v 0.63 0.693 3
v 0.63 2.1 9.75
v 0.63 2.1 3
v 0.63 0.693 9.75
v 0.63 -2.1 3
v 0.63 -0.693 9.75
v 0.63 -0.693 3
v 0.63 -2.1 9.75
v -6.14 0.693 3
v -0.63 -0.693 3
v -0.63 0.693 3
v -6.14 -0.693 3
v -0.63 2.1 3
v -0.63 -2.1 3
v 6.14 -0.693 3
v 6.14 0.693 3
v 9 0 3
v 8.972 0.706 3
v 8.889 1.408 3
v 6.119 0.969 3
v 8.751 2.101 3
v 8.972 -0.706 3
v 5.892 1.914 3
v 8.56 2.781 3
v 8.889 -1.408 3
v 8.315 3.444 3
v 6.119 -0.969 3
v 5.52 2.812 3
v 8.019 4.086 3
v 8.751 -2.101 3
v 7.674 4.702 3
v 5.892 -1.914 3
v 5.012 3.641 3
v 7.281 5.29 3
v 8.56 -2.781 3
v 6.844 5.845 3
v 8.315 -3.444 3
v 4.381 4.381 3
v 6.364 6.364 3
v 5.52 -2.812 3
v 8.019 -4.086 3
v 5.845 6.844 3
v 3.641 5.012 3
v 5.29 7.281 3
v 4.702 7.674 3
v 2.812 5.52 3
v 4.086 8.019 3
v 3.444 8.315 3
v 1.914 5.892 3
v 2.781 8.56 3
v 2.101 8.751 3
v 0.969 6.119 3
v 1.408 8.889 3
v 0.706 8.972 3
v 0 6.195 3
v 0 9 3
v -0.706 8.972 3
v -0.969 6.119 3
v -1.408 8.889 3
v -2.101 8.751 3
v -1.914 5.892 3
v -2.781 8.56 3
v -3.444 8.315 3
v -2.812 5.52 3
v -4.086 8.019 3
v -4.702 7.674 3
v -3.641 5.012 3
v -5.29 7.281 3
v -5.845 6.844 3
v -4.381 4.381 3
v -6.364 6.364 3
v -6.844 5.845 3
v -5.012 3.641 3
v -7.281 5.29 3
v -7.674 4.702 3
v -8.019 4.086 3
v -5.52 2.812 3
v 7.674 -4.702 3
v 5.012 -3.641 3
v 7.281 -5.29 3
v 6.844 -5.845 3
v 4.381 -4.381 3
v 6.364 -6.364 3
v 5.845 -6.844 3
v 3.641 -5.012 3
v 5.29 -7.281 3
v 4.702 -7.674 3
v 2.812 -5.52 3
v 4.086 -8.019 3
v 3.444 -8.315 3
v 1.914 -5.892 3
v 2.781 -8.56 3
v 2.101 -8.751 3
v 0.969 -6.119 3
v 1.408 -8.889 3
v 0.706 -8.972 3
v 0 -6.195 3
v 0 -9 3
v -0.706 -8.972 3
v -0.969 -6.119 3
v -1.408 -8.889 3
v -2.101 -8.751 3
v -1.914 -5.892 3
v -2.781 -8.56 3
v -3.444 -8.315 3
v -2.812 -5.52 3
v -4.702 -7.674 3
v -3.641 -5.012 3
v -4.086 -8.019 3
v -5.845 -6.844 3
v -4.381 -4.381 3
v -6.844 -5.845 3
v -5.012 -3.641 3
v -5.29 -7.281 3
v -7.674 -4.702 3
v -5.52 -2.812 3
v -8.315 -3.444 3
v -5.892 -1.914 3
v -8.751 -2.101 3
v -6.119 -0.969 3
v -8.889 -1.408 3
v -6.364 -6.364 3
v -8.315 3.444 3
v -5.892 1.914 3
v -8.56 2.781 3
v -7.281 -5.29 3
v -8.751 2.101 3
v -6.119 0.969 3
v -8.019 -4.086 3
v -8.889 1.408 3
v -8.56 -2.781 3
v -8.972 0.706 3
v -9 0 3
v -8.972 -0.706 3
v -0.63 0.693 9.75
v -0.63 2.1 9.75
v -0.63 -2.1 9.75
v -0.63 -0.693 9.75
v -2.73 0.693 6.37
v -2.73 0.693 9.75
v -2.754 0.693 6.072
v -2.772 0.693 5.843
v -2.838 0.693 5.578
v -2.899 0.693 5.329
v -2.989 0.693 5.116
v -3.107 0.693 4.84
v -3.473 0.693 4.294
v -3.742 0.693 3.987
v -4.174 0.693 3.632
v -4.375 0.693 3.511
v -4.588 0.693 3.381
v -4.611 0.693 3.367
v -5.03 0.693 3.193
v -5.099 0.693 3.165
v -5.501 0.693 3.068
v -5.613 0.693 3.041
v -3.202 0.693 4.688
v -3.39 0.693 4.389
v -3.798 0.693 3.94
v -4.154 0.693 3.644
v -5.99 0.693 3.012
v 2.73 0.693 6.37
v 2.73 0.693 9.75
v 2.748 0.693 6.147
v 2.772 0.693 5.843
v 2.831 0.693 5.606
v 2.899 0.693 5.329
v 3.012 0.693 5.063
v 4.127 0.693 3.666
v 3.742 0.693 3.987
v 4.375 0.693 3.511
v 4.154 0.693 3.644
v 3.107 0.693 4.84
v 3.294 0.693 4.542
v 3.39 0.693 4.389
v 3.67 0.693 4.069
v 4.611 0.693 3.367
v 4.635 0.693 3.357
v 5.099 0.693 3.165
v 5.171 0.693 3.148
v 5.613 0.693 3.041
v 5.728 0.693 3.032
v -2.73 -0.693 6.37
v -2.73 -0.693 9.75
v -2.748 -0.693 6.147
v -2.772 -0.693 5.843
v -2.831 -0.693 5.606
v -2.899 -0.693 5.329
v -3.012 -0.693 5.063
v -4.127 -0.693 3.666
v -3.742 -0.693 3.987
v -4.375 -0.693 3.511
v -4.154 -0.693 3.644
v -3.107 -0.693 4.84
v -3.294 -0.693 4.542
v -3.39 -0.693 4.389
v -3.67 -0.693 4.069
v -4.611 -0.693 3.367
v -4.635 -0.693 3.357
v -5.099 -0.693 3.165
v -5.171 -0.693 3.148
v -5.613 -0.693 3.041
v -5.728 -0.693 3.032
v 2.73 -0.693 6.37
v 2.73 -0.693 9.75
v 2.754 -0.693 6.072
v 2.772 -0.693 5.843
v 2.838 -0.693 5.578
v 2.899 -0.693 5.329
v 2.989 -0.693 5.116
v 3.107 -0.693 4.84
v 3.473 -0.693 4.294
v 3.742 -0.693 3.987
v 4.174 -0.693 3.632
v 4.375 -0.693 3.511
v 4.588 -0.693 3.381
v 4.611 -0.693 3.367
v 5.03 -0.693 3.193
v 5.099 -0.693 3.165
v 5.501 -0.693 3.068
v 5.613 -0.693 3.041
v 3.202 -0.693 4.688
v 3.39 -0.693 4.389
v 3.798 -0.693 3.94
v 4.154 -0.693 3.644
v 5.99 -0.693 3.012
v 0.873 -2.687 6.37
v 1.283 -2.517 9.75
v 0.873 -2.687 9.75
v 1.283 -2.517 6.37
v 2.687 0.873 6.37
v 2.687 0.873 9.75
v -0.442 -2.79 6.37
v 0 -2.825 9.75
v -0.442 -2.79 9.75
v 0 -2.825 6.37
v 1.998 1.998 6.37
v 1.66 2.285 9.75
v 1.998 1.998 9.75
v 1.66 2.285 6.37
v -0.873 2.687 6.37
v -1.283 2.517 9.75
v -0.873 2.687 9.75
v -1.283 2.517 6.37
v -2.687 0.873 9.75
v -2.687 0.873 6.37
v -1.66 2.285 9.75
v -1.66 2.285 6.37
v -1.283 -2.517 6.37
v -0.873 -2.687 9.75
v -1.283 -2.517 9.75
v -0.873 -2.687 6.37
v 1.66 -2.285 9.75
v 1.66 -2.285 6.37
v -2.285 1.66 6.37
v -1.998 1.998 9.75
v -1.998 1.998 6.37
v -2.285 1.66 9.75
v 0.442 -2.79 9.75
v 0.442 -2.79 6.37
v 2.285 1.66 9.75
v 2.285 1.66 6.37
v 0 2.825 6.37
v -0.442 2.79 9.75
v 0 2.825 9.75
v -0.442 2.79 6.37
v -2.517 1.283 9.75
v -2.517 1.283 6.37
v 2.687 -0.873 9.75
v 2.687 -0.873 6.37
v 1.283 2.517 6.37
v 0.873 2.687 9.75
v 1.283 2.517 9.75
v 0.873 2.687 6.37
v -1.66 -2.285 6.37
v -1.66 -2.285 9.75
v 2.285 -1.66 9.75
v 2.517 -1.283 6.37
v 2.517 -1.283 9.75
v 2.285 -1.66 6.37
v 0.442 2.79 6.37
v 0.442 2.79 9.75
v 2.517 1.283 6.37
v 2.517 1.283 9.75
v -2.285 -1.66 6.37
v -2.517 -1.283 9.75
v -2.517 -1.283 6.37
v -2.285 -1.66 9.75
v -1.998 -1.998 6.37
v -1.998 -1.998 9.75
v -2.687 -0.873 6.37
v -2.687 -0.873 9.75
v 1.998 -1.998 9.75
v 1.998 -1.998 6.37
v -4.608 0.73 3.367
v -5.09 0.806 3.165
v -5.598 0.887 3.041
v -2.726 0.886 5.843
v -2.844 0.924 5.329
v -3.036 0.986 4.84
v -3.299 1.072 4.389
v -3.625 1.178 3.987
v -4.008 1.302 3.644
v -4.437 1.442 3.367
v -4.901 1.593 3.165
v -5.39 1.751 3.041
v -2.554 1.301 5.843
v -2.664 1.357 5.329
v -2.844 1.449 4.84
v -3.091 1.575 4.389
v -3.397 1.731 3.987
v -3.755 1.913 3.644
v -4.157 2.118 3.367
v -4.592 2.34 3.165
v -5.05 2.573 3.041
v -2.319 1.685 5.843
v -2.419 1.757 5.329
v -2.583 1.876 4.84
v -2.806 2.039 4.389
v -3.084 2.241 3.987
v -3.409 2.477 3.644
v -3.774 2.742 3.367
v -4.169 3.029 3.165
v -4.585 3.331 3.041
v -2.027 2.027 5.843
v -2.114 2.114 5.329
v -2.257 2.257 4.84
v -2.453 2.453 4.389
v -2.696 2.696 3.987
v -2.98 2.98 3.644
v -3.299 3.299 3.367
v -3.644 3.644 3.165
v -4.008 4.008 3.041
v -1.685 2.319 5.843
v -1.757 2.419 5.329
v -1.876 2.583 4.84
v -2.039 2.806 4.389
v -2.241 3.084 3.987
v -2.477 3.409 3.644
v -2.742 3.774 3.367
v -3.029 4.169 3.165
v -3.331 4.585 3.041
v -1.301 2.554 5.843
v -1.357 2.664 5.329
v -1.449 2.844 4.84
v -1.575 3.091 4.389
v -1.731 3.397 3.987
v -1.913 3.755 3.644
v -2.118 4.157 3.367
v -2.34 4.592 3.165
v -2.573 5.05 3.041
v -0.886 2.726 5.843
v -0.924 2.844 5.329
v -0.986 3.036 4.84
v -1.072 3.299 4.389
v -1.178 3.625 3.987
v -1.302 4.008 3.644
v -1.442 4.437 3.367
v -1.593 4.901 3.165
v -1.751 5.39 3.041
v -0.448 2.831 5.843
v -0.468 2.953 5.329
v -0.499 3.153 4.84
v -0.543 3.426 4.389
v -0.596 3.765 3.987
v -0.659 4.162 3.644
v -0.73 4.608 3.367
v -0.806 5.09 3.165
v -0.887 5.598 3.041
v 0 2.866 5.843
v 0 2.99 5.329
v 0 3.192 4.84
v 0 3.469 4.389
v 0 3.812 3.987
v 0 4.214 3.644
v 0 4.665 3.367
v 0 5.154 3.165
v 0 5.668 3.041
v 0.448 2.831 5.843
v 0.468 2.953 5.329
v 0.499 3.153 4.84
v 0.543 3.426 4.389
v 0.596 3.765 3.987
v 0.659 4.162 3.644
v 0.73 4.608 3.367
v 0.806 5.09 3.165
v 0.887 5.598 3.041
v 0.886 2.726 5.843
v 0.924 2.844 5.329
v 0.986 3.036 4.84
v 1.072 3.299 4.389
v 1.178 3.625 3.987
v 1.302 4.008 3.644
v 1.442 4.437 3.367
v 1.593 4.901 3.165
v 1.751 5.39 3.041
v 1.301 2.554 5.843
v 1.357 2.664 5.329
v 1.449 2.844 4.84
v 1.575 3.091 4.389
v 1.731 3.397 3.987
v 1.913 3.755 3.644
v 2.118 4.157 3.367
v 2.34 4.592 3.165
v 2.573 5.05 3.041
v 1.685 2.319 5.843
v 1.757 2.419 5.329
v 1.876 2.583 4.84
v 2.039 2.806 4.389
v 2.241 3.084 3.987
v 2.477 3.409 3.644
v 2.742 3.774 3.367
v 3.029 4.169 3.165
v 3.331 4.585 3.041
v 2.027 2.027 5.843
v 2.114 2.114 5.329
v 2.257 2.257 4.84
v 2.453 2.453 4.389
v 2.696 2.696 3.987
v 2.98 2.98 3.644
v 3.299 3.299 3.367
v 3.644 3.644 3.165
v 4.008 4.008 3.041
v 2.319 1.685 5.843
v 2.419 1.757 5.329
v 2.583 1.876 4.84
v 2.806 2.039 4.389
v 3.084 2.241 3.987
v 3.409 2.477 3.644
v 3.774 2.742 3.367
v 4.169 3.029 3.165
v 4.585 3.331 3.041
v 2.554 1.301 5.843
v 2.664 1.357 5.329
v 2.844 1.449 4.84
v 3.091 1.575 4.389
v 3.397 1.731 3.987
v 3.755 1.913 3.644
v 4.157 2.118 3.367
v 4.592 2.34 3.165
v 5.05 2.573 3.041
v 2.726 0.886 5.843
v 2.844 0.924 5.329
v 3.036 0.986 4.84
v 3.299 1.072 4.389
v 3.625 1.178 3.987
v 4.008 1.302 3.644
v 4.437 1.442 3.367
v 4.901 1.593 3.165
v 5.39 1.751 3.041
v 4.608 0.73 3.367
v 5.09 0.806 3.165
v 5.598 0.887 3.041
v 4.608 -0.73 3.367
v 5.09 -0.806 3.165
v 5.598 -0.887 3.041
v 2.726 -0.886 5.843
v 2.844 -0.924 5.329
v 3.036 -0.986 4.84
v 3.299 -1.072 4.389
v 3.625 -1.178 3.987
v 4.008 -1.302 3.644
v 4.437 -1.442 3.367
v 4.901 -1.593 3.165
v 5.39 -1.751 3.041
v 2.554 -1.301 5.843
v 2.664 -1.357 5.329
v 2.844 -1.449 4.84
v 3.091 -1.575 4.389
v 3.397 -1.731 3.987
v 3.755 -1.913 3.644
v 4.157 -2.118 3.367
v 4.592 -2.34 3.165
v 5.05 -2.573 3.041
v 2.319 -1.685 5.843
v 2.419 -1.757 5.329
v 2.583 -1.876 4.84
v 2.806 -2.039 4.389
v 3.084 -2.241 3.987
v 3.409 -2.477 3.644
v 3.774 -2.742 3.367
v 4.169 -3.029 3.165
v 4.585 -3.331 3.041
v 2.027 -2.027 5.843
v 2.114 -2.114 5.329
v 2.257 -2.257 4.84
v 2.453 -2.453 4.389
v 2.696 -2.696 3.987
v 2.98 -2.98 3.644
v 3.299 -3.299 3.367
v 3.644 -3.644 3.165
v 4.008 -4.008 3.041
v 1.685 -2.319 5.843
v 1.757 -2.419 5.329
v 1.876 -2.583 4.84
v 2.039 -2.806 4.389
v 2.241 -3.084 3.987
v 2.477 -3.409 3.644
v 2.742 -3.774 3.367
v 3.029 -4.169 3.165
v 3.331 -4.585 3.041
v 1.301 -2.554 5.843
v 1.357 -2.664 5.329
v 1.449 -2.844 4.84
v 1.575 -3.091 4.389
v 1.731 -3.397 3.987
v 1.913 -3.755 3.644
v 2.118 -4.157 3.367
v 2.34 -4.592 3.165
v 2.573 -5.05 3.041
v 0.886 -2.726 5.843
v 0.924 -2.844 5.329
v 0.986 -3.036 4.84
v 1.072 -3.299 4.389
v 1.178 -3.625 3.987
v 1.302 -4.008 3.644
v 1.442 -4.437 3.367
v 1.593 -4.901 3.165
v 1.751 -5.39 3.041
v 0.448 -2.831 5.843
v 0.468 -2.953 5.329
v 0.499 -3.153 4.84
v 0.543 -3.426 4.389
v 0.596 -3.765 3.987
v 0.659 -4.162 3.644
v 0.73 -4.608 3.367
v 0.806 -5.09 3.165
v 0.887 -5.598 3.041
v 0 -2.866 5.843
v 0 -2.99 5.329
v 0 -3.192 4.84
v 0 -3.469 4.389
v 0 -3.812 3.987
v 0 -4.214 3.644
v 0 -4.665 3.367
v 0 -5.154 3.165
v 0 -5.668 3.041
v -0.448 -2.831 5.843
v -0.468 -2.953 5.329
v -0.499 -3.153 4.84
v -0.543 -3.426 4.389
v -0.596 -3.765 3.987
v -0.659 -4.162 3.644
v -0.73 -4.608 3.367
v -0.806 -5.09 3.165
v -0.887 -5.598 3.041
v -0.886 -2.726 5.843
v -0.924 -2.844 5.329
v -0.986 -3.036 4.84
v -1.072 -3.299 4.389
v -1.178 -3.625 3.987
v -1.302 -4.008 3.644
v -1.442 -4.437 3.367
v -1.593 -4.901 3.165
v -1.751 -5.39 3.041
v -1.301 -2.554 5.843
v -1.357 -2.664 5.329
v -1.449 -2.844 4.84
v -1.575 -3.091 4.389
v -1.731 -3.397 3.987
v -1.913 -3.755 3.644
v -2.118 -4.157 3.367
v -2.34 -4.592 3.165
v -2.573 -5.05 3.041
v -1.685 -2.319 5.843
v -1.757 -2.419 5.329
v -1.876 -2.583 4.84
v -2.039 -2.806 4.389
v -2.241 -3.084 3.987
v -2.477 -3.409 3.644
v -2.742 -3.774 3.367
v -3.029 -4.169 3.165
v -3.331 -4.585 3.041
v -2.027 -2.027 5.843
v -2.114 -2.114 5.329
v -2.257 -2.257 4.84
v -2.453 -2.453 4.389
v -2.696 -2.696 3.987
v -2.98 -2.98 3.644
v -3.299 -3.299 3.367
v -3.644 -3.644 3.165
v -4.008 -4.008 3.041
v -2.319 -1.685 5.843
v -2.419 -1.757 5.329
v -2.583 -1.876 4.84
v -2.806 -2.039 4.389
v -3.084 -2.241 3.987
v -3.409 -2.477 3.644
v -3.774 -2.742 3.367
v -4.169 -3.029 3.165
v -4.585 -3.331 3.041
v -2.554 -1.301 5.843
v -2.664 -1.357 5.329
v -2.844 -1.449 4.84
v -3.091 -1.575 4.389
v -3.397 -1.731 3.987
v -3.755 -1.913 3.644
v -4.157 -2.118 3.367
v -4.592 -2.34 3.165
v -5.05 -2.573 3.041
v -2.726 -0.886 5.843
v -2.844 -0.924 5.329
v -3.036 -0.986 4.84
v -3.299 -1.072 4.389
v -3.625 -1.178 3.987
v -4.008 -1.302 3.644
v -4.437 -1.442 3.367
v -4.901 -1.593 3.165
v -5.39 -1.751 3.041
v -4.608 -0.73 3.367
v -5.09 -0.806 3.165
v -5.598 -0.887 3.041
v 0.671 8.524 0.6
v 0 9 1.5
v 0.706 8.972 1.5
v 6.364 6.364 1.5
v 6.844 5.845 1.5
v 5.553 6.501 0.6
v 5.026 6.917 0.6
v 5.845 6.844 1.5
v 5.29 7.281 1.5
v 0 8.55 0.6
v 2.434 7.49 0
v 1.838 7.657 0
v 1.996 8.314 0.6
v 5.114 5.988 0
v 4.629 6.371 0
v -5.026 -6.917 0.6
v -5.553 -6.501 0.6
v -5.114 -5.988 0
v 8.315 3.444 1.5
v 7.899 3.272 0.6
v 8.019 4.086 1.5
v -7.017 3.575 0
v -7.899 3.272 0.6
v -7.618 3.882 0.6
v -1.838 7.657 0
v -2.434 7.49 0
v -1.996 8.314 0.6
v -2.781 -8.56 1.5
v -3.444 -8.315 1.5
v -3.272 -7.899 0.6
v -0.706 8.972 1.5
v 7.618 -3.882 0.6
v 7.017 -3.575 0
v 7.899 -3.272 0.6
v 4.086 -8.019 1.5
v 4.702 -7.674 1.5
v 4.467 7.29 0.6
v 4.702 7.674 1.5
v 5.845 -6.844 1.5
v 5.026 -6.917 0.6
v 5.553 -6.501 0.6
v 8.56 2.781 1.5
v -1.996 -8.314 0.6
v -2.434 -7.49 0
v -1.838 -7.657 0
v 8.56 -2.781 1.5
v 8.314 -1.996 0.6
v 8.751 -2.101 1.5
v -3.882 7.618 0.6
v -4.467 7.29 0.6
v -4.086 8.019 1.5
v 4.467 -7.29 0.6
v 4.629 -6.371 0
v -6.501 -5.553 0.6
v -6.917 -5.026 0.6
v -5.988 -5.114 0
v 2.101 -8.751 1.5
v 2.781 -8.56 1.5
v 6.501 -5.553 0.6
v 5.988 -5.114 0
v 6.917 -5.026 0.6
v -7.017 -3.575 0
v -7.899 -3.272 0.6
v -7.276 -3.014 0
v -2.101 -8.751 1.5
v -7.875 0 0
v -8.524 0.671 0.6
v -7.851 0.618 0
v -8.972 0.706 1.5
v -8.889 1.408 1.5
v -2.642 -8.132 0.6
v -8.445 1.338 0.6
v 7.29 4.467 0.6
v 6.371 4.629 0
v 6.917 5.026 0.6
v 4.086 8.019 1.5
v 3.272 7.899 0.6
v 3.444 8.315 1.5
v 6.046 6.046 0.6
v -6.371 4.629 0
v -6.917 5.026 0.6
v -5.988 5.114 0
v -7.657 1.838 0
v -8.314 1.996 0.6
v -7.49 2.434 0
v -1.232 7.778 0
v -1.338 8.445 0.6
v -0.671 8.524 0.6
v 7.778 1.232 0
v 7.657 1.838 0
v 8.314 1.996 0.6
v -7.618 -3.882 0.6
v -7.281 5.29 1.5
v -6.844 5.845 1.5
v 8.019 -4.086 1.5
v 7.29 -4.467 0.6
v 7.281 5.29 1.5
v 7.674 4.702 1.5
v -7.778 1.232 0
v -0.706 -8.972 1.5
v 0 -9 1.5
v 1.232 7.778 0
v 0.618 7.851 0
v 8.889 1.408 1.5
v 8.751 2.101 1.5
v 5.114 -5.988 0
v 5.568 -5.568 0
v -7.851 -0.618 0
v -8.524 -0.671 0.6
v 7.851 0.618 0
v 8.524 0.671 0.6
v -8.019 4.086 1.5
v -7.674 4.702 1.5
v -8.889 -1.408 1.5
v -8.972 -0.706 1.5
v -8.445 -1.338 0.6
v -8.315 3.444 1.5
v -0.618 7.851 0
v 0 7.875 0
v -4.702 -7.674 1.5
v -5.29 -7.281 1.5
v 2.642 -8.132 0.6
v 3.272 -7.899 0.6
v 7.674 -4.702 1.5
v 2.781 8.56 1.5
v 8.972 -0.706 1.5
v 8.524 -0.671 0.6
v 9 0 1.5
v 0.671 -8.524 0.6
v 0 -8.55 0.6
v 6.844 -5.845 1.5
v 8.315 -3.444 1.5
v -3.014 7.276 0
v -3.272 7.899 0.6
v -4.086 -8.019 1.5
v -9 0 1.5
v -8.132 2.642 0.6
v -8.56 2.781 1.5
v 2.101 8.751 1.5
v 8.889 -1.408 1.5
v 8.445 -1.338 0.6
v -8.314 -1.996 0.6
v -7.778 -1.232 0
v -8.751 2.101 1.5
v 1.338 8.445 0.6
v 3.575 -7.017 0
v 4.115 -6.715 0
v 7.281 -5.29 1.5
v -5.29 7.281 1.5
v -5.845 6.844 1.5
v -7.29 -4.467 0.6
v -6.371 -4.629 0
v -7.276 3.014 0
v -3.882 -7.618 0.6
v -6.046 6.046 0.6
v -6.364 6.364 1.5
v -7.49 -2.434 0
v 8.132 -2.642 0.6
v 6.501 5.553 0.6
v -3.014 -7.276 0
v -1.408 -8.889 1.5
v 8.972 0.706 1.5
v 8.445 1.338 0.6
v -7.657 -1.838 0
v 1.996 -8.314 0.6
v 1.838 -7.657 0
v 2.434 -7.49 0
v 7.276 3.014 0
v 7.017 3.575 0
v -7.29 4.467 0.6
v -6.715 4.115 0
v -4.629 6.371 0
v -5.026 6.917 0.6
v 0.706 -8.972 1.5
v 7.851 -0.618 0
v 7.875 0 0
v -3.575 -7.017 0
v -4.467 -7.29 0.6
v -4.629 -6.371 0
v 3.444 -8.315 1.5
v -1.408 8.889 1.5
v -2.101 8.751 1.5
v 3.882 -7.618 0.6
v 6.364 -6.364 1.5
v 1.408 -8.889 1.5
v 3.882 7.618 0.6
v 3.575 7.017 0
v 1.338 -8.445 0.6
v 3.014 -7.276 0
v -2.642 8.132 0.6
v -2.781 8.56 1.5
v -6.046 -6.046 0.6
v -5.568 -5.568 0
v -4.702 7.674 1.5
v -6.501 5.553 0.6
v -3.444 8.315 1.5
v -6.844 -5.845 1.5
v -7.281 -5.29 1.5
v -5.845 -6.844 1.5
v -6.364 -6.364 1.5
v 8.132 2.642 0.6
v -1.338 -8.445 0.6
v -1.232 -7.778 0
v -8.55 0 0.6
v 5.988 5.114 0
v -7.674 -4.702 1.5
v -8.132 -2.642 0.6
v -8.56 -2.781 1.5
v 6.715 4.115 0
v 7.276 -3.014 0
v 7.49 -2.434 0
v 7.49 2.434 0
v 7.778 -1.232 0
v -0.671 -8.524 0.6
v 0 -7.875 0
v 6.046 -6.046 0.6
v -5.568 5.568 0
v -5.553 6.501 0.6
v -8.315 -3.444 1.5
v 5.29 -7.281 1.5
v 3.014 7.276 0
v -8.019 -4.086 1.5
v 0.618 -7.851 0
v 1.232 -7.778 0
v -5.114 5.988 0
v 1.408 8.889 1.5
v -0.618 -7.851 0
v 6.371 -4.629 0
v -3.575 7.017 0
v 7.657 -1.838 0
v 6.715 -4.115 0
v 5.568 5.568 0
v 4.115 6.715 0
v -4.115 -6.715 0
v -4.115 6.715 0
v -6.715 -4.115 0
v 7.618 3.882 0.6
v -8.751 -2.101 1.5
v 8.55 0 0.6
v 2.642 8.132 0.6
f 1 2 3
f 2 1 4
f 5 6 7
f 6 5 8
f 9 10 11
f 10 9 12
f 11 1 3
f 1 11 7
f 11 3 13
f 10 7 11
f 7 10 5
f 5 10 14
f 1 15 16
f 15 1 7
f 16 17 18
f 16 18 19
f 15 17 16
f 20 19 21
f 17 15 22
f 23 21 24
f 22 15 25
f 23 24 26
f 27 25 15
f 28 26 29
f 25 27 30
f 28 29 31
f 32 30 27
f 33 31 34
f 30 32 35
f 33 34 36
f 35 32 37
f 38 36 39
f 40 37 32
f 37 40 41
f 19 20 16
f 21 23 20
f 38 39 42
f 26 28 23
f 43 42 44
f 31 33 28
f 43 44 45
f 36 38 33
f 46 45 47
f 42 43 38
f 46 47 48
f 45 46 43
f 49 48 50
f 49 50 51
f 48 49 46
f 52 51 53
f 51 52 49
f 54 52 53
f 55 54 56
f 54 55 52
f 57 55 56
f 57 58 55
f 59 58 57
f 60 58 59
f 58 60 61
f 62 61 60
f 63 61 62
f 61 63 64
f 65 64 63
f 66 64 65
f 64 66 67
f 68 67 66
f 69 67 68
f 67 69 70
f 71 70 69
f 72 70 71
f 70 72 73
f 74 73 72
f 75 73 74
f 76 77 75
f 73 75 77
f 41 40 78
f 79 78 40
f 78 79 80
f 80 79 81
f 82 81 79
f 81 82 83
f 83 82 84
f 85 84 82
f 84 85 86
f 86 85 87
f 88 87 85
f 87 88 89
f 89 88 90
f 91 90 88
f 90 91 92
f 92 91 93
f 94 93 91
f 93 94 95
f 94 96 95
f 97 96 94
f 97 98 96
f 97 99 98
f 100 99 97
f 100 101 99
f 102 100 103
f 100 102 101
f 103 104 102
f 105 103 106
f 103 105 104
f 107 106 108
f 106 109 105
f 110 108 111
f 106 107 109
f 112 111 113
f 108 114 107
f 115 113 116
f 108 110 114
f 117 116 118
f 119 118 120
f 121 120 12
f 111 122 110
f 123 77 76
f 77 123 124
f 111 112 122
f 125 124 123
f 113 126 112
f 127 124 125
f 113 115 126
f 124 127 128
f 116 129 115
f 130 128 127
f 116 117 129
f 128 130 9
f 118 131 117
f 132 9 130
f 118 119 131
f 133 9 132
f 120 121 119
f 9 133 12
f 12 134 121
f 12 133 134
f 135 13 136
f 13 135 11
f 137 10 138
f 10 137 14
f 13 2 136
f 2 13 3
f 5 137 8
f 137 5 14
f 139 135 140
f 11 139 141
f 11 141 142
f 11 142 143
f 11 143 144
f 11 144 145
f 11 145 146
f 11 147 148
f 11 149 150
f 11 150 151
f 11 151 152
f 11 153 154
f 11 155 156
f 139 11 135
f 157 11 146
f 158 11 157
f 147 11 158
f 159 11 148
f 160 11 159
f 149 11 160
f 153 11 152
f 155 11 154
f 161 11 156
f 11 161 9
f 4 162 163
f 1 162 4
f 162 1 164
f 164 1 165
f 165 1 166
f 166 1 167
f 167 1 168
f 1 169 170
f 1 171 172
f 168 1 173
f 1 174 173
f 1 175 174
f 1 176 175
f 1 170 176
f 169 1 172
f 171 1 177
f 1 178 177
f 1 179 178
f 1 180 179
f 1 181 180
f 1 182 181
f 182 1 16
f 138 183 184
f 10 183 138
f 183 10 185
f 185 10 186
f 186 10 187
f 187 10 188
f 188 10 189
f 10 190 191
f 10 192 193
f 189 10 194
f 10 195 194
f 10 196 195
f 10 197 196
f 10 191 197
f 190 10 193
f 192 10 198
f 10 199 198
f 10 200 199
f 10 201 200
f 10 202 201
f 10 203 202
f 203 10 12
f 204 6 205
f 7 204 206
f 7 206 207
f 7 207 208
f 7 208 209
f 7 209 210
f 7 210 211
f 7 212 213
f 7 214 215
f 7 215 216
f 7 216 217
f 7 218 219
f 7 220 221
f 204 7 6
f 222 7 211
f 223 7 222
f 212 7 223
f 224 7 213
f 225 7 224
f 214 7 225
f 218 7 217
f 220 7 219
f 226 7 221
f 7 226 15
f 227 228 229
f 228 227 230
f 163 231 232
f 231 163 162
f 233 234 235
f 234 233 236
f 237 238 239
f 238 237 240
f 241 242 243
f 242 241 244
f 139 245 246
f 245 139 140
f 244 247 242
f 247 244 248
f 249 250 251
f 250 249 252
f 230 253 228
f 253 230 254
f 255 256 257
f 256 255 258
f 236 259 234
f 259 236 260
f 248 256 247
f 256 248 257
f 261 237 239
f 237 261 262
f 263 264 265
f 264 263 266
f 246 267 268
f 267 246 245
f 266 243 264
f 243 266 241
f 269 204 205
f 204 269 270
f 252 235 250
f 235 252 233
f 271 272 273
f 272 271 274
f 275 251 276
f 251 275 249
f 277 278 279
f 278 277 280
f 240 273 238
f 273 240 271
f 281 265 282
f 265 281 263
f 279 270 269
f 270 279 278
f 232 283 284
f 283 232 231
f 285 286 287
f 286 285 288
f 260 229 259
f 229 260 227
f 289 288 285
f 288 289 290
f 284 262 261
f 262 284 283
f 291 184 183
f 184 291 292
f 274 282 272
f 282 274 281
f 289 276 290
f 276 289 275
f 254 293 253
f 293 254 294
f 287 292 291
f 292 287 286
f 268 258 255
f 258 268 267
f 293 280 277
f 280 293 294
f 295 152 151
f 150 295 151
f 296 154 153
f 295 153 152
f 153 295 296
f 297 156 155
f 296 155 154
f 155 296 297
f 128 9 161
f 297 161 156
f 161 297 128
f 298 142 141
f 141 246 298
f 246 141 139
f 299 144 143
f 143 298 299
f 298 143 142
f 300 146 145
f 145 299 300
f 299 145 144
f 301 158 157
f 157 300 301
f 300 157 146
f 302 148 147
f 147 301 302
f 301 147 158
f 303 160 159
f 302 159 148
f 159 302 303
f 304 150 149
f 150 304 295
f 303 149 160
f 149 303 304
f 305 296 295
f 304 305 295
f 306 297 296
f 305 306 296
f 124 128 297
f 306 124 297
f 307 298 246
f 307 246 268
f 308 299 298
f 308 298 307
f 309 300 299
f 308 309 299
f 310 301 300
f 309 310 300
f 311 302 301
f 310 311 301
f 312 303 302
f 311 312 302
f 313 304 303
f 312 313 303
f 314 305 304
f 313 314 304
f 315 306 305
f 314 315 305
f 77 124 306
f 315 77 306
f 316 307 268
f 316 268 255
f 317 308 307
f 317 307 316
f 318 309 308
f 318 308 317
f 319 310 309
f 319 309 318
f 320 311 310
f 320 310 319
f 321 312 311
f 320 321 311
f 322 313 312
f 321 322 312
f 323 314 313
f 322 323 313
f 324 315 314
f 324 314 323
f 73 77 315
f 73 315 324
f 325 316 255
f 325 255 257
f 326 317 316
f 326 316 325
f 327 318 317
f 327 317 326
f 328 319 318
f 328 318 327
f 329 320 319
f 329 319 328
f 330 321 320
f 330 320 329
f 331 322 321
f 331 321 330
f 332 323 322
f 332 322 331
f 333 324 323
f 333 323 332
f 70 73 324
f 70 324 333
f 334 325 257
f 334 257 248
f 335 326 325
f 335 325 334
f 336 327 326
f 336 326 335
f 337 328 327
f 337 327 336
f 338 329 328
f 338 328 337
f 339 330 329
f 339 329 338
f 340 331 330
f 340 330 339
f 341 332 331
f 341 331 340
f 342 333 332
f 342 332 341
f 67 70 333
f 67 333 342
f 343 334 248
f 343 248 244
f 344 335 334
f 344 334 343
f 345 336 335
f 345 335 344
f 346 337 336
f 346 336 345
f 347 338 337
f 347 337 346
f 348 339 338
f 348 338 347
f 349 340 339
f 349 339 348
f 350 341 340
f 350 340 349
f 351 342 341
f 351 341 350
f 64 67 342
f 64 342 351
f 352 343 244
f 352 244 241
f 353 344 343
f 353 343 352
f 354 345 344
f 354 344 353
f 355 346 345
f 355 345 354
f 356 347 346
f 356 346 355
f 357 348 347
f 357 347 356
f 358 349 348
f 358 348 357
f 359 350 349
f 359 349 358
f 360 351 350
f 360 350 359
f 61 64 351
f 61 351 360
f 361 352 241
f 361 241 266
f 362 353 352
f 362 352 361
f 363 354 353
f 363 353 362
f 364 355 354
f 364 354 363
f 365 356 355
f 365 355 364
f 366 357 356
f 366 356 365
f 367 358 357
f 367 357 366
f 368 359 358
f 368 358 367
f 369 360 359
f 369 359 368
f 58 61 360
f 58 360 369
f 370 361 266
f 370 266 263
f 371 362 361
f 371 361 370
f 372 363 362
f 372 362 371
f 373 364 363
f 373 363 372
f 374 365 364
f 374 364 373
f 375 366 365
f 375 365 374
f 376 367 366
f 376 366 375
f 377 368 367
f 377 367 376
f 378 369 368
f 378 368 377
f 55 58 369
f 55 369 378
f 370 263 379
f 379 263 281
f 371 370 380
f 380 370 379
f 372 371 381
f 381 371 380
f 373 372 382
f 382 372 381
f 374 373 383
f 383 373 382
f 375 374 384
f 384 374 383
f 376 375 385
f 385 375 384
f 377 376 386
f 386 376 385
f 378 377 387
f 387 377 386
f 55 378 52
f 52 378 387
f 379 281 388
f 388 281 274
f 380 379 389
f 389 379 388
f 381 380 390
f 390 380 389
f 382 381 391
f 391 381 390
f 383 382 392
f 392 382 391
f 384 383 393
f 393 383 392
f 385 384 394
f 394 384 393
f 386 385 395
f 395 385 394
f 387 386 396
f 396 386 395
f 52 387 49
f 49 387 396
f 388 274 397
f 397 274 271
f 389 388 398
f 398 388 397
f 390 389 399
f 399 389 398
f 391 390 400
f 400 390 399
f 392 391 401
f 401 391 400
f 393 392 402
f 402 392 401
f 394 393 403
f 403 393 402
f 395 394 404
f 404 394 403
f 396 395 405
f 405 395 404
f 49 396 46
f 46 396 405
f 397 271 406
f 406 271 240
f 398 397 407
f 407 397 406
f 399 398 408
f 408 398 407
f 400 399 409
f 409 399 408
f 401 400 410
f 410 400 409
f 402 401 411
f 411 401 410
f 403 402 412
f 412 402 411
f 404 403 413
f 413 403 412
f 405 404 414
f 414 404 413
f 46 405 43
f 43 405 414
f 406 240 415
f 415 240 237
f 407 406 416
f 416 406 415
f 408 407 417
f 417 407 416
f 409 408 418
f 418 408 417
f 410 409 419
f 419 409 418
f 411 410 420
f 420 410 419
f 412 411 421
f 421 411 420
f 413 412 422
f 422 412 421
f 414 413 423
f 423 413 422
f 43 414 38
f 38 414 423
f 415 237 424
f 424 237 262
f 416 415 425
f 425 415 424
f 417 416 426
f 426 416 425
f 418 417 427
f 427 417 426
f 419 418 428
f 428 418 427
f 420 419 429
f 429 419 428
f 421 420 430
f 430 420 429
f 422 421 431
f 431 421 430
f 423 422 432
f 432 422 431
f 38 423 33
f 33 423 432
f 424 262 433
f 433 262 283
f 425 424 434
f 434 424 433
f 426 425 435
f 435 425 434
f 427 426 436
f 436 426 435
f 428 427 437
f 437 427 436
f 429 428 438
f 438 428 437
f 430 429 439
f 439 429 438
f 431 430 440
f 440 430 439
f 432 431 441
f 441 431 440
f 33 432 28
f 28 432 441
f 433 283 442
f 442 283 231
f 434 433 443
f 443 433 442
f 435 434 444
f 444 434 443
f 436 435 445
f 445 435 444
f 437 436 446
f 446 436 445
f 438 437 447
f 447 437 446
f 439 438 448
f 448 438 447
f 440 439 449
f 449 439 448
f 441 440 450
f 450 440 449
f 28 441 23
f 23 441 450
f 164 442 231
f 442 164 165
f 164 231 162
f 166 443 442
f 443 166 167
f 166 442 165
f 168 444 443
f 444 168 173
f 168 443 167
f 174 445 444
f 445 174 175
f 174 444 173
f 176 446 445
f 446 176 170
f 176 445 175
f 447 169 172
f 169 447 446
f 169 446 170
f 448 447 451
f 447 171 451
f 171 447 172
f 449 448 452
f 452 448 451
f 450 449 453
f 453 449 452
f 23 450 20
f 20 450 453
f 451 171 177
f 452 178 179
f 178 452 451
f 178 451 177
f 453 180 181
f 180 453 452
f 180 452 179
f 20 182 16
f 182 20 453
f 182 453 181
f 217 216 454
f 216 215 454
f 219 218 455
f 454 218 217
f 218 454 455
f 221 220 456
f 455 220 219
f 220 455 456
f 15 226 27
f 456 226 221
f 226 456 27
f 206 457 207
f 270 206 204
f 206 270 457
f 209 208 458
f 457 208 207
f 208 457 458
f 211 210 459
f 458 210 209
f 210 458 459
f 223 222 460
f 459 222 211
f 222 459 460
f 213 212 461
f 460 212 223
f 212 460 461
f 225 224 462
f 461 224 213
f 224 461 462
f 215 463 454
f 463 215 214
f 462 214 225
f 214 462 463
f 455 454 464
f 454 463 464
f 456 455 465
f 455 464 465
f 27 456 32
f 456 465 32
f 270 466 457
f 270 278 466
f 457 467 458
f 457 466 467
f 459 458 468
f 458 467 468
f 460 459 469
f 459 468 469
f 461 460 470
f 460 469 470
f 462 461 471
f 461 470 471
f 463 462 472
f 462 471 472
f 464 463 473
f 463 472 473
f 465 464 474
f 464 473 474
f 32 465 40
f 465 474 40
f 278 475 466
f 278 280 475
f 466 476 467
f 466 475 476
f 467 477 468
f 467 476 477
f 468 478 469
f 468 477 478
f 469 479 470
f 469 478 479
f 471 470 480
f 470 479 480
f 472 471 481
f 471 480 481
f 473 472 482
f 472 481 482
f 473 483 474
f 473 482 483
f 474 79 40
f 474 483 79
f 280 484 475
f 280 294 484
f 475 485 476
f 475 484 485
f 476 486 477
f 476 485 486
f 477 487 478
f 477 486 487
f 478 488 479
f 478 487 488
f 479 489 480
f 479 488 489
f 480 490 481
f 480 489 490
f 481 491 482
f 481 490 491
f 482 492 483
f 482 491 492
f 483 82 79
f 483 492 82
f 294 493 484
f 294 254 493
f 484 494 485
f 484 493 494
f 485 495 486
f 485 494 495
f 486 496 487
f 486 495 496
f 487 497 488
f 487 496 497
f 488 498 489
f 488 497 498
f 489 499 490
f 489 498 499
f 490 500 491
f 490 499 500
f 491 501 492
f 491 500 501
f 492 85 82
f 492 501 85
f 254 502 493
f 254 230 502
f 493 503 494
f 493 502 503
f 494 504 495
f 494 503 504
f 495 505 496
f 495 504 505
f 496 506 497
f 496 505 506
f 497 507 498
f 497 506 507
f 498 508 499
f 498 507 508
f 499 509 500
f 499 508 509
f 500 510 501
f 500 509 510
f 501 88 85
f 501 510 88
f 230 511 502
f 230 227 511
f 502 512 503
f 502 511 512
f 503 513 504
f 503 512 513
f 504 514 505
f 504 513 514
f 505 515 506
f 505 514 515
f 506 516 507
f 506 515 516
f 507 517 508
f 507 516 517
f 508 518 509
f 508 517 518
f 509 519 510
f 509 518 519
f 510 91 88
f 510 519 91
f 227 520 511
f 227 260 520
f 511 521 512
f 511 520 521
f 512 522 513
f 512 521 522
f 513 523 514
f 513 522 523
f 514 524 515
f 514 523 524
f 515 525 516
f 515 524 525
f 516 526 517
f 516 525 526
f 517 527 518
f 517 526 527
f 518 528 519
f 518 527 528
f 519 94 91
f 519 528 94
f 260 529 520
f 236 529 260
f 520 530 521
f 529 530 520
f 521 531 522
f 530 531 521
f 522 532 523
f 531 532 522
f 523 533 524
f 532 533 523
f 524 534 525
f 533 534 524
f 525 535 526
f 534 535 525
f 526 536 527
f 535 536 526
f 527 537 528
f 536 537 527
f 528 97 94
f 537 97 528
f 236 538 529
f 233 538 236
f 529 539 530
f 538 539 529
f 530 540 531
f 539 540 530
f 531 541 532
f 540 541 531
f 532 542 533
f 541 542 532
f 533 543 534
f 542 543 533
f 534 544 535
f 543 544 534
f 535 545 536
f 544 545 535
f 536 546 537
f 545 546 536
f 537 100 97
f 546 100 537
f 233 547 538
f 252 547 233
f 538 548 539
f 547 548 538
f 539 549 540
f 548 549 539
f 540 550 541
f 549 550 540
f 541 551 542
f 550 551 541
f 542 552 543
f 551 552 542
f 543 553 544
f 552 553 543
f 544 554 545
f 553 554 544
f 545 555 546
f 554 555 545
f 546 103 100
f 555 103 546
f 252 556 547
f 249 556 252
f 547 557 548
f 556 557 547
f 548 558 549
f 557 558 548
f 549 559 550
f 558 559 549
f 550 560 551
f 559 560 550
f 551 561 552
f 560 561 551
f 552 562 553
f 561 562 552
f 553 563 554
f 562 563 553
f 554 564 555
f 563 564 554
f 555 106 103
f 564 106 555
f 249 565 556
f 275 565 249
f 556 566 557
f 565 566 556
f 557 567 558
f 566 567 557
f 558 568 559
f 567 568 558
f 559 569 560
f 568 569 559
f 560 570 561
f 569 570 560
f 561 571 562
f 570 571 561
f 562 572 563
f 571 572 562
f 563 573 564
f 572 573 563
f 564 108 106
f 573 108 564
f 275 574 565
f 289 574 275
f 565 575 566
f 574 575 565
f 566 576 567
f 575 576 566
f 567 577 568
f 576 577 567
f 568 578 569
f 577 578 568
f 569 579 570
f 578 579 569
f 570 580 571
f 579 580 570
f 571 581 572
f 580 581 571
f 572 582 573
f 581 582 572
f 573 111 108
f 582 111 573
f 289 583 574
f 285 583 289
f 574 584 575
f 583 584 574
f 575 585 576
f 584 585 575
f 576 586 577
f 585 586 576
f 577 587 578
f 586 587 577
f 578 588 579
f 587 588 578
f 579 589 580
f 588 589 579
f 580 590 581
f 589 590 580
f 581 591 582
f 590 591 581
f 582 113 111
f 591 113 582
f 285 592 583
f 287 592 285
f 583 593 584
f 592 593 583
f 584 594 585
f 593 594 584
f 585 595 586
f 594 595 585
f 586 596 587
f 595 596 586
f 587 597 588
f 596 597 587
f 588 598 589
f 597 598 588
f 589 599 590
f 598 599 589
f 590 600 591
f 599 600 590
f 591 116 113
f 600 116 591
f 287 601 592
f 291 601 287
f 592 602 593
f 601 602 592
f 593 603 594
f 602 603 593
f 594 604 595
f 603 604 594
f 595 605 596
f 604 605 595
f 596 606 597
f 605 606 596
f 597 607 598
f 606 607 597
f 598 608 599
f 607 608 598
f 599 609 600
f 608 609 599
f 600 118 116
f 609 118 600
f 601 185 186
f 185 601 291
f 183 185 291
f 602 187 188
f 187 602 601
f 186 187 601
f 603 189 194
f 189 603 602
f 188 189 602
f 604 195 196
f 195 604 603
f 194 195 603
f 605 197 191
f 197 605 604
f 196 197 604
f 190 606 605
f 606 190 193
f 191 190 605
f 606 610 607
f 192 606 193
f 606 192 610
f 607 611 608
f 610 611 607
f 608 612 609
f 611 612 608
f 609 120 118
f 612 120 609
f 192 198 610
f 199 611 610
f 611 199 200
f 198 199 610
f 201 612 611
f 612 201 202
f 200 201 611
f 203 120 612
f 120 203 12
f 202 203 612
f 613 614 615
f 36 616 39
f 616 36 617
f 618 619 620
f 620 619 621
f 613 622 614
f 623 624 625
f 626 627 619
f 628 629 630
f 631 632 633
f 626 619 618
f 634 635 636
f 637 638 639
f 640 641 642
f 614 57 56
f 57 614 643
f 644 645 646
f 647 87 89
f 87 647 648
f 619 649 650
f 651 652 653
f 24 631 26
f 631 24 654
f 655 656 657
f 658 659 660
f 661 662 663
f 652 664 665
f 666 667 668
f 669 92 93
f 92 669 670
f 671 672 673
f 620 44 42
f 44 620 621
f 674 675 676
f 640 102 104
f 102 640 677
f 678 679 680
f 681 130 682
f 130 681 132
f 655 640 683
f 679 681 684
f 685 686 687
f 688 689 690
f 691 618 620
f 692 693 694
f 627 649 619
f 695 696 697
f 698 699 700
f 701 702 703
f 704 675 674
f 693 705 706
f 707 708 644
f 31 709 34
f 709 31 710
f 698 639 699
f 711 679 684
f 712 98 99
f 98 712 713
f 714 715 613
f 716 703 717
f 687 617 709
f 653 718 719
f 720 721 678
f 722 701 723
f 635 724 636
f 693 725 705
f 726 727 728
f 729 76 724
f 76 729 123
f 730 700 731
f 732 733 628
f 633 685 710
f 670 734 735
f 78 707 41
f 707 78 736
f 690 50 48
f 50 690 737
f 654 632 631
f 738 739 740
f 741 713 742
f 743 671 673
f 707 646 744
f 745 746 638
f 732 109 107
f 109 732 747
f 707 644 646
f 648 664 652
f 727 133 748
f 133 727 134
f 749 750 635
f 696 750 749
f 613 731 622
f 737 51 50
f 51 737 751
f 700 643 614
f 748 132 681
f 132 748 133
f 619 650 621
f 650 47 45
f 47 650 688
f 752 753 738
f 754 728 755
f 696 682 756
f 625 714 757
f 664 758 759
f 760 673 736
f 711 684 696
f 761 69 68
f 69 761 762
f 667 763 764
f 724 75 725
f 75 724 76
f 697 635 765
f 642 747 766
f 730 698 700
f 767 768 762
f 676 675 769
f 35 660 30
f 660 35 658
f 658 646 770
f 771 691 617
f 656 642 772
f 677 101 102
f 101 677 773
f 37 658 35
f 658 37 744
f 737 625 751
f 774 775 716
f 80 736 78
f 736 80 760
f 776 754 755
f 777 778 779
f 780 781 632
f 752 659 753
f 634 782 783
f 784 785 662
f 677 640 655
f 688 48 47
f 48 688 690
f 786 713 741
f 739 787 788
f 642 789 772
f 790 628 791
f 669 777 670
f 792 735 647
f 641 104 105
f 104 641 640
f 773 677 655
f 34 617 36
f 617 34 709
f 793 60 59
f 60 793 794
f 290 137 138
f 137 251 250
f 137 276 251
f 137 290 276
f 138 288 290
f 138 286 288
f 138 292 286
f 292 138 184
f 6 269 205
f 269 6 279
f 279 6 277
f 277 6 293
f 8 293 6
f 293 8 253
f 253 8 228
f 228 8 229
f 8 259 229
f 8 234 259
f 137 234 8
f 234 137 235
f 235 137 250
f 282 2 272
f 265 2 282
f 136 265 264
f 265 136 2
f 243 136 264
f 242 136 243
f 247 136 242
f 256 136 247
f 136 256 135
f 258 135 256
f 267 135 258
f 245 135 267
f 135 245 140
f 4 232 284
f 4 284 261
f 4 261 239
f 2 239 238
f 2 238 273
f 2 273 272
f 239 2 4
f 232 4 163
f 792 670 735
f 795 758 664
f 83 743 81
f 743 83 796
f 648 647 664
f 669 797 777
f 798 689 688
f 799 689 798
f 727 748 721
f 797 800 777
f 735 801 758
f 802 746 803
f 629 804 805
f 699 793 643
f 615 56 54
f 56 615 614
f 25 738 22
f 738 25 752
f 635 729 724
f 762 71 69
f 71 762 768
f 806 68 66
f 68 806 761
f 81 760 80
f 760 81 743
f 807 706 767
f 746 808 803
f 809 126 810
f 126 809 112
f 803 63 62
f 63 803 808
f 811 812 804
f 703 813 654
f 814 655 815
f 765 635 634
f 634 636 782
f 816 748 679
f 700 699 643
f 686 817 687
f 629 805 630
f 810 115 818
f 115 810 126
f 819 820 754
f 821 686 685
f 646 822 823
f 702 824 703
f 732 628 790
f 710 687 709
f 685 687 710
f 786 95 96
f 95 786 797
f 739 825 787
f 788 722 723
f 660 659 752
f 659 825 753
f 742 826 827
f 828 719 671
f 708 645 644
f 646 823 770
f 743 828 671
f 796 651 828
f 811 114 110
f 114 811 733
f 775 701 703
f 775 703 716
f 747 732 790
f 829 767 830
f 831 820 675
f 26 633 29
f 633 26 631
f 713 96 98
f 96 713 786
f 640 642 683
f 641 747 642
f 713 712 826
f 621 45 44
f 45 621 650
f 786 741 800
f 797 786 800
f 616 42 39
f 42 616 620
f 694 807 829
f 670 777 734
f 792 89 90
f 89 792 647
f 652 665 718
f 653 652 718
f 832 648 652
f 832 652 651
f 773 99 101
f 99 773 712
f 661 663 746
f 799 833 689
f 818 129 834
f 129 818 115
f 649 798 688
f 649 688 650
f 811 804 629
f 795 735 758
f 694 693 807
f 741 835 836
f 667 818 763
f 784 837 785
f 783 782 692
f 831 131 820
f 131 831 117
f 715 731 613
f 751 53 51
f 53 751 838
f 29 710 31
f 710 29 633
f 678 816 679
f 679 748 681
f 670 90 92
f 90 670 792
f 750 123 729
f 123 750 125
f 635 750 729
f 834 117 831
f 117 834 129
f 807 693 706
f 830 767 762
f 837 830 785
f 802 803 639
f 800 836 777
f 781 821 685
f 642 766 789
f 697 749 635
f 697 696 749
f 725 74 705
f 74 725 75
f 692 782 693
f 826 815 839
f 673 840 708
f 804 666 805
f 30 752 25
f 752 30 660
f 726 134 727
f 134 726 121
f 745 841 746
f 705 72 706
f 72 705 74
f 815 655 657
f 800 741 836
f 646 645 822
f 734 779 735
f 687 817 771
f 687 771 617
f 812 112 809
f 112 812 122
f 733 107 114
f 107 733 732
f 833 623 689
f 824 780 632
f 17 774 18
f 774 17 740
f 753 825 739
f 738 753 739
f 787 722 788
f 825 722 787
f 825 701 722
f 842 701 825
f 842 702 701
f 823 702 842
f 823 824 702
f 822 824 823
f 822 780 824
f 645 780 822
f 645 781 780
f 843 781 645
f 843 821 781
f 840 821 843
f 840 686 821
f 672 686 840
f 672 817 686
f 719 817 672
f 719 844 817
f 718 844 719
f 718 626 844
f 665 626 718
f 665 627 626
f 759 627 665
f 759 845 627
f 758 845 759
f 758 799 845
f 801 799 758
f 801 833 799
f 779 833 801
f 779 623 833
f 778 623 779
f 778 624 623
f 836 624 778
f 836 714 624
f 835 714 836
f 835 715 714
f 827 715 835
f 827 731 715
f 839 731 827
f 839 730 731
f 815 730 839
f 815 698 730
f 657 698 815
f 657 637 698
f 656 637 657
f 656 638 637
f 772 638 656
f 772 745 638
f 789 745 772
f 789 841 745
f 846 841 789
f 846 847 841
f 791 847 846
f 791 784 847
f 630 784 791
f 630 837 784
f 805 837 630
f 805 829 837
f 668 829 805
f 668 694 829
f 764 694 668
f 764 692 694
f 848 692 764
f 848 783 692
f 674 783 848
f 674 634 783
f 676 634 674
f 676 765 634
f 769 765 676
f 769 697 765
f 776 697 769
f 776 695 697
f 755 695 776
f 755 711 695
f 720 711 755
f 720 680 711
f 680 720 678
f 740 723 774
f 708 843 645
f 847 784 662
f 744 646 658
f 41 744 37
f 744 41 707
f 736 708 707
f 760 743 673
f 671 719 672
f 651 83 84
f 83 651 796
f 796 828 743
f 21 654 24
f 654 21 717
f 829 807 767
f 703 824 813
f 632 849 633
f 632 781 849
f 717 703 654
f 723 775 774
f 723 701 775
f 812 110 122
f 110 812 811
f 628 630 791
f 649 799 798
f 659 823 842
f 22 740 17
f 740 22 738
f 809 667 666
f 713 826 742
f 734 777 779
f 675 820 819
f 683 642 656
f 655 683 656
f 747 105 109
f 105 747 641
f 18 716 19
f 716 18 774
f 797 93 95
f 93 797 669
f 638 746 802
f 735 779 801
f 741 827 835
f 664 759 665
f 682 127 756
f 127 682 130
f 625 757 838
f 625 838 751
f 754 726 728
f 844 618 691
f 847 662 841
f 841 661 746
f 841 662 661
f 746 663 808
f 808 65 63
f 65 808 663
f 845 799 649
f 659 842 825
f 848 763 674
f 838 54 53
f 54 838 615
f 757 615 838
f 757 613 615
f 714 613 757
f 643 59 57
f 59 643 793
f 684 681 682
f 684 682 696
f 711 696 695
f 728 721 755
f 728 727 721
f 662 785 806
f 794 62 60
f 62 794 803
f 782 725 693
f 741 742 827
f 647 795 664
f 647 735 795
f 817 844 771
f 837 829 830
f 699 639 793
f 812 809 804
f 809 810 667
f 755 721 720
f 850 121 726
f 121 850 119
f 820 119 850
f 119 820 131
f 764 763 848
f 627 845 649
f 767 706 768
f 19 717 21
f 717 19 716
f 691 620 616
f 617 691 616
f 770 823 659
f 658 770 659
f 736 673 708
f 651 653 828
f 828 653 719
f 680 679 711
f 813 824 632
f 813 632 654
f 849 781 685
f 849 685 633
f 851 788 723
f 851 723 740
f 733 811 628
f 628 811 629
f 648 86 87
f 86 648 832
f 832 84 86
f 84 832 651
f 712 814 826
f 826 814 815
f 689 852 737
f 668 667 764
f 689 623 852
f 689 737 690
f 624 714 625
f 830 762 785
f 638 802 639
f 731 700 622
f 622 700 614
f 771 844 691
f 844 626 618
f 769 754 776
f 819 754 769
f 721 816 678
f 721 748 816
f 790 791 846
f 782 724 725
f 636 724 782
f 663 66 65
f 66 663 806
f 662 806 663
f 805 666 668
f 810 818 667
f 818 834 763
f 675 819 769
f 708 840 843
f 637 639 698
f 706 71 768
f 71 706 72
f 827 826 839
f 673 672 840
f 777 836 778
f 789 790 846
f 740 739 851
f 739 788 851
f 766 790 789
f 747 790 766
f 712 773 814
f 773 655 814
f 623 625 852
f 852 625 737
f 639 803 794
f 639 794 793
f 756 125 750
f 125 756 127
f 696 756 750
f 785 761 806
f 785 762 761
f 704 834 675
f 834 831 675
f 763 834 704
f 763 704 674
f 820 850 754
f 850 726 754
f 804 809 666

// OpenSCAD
// Base Number of Faces
$fn = 40;

// Face Diameter
face_diameter = 18; // [8:23]
face_radius = face_diameter/2;

// Face Thickness
face_thickness = 3; // [2:0.1:7]

// Total Key Height
key_height = 10.5; // [6:0.1:15]

// Width Multiplier of the Key
key_width = 1; // [1:0.05:8]

// Text on Face
text = "";

// Text Size Multiplier
text_multiplier = 1;

// Text Depth
text_depth = 1; // [0.1:0.1:5]

// Fillet Radius
curve_radius = 3.37; // [0.5:0.1:5]

// Stem Diameter
stem_diameter = 5.65; // [4.2:0.1:6]
stem_radius = stem_diameter/2;

// Cross Thickness (make small changes only)
cross_thickness = 1.26;

// Cross Width (make small changes only)
cross_width = 4.2;
cross_depth = key_height - face_thickness;

// The distance to move the underlying key counters when making a wide key
key_multiplier = (face_radius * key_width) - face_radius;

// Cutter tool for the cross
module cross_cutter() {
  translate([0, 0, face_thickness + (cross_depth/2)]) {
    cube([cross_thickness, cross_width, cross_depth], center = true);
    rotate([0, 0, 90]) {
      cube([cross_thickness * 1.1, face_diameter, cross_depth], center = true);
    }
  }
}

module key_counter() {
  hull() {
    face_thickness_quarter = face_thickness/4;
    cylinder(r = face_radius*0.875, h = face_thickness_quarter, $fn = $fn * 2);
    translate([0, 0, face_thickness_quarter * 0.8]) {
      cylinder(r = face_radius*0.95, h = face_thickness_quarter, $fn = $fn * 2);
    }
    translate([0, 0, face_thickness_quarter * 2]) {
      cylinder(r = face_radius, h = face_thickness_quarter, $fn = $fn * 2);
    }
    translate([0, 0, face_thickness_quarter * 3]) {
      cylinder(r = face_radius, h = key_height - face_thickness, $fn = $fn * 2);
    }
  }
}



// Rest of the key construction
translate([0, 0, 0]) {
  difference() {
    hull() {
      translate([0, 0 - key_multiplier, 0]) {
        key_counter();
      }
      translate([0, key_multiplier, 0]) {
        key_counter();
      }
    }

    cross_cutter();

    translate([0, 0, face_thickness]) {
      union() {
        translate([0, 0, curve_radius]) {
          difference() {
            cylinder(r = stem_diameter * 2, h = key_height - face_thickness);
            cylinder(r = stem_radius, h = key_height - face_thickness);
          }
        }
        difference() {
          cylinder(r = (face_radius * 2) * key_width, h = key_height - face_thickness);
          cylinder(r = stem_radius + curve_radius, h = key_height - face_thickness);
        }
        rotate_extrude(convexity = 10) {
          translate([stem_radius + curve_radius, curve_radius, 0]) {
            circle(r = curve_radius);
          }
        }
      }
    }
    linear_extrude(text_depth) {
      translate([0, -0.2, 0]) {
        rotate([180, 0, 90]) {
          text(text, font = "Lato:style=Bold", halign = "center", valign = "center", size = (face_diameter * 0.5) * text_multiplier);
        }
      }
    }
  }
}
